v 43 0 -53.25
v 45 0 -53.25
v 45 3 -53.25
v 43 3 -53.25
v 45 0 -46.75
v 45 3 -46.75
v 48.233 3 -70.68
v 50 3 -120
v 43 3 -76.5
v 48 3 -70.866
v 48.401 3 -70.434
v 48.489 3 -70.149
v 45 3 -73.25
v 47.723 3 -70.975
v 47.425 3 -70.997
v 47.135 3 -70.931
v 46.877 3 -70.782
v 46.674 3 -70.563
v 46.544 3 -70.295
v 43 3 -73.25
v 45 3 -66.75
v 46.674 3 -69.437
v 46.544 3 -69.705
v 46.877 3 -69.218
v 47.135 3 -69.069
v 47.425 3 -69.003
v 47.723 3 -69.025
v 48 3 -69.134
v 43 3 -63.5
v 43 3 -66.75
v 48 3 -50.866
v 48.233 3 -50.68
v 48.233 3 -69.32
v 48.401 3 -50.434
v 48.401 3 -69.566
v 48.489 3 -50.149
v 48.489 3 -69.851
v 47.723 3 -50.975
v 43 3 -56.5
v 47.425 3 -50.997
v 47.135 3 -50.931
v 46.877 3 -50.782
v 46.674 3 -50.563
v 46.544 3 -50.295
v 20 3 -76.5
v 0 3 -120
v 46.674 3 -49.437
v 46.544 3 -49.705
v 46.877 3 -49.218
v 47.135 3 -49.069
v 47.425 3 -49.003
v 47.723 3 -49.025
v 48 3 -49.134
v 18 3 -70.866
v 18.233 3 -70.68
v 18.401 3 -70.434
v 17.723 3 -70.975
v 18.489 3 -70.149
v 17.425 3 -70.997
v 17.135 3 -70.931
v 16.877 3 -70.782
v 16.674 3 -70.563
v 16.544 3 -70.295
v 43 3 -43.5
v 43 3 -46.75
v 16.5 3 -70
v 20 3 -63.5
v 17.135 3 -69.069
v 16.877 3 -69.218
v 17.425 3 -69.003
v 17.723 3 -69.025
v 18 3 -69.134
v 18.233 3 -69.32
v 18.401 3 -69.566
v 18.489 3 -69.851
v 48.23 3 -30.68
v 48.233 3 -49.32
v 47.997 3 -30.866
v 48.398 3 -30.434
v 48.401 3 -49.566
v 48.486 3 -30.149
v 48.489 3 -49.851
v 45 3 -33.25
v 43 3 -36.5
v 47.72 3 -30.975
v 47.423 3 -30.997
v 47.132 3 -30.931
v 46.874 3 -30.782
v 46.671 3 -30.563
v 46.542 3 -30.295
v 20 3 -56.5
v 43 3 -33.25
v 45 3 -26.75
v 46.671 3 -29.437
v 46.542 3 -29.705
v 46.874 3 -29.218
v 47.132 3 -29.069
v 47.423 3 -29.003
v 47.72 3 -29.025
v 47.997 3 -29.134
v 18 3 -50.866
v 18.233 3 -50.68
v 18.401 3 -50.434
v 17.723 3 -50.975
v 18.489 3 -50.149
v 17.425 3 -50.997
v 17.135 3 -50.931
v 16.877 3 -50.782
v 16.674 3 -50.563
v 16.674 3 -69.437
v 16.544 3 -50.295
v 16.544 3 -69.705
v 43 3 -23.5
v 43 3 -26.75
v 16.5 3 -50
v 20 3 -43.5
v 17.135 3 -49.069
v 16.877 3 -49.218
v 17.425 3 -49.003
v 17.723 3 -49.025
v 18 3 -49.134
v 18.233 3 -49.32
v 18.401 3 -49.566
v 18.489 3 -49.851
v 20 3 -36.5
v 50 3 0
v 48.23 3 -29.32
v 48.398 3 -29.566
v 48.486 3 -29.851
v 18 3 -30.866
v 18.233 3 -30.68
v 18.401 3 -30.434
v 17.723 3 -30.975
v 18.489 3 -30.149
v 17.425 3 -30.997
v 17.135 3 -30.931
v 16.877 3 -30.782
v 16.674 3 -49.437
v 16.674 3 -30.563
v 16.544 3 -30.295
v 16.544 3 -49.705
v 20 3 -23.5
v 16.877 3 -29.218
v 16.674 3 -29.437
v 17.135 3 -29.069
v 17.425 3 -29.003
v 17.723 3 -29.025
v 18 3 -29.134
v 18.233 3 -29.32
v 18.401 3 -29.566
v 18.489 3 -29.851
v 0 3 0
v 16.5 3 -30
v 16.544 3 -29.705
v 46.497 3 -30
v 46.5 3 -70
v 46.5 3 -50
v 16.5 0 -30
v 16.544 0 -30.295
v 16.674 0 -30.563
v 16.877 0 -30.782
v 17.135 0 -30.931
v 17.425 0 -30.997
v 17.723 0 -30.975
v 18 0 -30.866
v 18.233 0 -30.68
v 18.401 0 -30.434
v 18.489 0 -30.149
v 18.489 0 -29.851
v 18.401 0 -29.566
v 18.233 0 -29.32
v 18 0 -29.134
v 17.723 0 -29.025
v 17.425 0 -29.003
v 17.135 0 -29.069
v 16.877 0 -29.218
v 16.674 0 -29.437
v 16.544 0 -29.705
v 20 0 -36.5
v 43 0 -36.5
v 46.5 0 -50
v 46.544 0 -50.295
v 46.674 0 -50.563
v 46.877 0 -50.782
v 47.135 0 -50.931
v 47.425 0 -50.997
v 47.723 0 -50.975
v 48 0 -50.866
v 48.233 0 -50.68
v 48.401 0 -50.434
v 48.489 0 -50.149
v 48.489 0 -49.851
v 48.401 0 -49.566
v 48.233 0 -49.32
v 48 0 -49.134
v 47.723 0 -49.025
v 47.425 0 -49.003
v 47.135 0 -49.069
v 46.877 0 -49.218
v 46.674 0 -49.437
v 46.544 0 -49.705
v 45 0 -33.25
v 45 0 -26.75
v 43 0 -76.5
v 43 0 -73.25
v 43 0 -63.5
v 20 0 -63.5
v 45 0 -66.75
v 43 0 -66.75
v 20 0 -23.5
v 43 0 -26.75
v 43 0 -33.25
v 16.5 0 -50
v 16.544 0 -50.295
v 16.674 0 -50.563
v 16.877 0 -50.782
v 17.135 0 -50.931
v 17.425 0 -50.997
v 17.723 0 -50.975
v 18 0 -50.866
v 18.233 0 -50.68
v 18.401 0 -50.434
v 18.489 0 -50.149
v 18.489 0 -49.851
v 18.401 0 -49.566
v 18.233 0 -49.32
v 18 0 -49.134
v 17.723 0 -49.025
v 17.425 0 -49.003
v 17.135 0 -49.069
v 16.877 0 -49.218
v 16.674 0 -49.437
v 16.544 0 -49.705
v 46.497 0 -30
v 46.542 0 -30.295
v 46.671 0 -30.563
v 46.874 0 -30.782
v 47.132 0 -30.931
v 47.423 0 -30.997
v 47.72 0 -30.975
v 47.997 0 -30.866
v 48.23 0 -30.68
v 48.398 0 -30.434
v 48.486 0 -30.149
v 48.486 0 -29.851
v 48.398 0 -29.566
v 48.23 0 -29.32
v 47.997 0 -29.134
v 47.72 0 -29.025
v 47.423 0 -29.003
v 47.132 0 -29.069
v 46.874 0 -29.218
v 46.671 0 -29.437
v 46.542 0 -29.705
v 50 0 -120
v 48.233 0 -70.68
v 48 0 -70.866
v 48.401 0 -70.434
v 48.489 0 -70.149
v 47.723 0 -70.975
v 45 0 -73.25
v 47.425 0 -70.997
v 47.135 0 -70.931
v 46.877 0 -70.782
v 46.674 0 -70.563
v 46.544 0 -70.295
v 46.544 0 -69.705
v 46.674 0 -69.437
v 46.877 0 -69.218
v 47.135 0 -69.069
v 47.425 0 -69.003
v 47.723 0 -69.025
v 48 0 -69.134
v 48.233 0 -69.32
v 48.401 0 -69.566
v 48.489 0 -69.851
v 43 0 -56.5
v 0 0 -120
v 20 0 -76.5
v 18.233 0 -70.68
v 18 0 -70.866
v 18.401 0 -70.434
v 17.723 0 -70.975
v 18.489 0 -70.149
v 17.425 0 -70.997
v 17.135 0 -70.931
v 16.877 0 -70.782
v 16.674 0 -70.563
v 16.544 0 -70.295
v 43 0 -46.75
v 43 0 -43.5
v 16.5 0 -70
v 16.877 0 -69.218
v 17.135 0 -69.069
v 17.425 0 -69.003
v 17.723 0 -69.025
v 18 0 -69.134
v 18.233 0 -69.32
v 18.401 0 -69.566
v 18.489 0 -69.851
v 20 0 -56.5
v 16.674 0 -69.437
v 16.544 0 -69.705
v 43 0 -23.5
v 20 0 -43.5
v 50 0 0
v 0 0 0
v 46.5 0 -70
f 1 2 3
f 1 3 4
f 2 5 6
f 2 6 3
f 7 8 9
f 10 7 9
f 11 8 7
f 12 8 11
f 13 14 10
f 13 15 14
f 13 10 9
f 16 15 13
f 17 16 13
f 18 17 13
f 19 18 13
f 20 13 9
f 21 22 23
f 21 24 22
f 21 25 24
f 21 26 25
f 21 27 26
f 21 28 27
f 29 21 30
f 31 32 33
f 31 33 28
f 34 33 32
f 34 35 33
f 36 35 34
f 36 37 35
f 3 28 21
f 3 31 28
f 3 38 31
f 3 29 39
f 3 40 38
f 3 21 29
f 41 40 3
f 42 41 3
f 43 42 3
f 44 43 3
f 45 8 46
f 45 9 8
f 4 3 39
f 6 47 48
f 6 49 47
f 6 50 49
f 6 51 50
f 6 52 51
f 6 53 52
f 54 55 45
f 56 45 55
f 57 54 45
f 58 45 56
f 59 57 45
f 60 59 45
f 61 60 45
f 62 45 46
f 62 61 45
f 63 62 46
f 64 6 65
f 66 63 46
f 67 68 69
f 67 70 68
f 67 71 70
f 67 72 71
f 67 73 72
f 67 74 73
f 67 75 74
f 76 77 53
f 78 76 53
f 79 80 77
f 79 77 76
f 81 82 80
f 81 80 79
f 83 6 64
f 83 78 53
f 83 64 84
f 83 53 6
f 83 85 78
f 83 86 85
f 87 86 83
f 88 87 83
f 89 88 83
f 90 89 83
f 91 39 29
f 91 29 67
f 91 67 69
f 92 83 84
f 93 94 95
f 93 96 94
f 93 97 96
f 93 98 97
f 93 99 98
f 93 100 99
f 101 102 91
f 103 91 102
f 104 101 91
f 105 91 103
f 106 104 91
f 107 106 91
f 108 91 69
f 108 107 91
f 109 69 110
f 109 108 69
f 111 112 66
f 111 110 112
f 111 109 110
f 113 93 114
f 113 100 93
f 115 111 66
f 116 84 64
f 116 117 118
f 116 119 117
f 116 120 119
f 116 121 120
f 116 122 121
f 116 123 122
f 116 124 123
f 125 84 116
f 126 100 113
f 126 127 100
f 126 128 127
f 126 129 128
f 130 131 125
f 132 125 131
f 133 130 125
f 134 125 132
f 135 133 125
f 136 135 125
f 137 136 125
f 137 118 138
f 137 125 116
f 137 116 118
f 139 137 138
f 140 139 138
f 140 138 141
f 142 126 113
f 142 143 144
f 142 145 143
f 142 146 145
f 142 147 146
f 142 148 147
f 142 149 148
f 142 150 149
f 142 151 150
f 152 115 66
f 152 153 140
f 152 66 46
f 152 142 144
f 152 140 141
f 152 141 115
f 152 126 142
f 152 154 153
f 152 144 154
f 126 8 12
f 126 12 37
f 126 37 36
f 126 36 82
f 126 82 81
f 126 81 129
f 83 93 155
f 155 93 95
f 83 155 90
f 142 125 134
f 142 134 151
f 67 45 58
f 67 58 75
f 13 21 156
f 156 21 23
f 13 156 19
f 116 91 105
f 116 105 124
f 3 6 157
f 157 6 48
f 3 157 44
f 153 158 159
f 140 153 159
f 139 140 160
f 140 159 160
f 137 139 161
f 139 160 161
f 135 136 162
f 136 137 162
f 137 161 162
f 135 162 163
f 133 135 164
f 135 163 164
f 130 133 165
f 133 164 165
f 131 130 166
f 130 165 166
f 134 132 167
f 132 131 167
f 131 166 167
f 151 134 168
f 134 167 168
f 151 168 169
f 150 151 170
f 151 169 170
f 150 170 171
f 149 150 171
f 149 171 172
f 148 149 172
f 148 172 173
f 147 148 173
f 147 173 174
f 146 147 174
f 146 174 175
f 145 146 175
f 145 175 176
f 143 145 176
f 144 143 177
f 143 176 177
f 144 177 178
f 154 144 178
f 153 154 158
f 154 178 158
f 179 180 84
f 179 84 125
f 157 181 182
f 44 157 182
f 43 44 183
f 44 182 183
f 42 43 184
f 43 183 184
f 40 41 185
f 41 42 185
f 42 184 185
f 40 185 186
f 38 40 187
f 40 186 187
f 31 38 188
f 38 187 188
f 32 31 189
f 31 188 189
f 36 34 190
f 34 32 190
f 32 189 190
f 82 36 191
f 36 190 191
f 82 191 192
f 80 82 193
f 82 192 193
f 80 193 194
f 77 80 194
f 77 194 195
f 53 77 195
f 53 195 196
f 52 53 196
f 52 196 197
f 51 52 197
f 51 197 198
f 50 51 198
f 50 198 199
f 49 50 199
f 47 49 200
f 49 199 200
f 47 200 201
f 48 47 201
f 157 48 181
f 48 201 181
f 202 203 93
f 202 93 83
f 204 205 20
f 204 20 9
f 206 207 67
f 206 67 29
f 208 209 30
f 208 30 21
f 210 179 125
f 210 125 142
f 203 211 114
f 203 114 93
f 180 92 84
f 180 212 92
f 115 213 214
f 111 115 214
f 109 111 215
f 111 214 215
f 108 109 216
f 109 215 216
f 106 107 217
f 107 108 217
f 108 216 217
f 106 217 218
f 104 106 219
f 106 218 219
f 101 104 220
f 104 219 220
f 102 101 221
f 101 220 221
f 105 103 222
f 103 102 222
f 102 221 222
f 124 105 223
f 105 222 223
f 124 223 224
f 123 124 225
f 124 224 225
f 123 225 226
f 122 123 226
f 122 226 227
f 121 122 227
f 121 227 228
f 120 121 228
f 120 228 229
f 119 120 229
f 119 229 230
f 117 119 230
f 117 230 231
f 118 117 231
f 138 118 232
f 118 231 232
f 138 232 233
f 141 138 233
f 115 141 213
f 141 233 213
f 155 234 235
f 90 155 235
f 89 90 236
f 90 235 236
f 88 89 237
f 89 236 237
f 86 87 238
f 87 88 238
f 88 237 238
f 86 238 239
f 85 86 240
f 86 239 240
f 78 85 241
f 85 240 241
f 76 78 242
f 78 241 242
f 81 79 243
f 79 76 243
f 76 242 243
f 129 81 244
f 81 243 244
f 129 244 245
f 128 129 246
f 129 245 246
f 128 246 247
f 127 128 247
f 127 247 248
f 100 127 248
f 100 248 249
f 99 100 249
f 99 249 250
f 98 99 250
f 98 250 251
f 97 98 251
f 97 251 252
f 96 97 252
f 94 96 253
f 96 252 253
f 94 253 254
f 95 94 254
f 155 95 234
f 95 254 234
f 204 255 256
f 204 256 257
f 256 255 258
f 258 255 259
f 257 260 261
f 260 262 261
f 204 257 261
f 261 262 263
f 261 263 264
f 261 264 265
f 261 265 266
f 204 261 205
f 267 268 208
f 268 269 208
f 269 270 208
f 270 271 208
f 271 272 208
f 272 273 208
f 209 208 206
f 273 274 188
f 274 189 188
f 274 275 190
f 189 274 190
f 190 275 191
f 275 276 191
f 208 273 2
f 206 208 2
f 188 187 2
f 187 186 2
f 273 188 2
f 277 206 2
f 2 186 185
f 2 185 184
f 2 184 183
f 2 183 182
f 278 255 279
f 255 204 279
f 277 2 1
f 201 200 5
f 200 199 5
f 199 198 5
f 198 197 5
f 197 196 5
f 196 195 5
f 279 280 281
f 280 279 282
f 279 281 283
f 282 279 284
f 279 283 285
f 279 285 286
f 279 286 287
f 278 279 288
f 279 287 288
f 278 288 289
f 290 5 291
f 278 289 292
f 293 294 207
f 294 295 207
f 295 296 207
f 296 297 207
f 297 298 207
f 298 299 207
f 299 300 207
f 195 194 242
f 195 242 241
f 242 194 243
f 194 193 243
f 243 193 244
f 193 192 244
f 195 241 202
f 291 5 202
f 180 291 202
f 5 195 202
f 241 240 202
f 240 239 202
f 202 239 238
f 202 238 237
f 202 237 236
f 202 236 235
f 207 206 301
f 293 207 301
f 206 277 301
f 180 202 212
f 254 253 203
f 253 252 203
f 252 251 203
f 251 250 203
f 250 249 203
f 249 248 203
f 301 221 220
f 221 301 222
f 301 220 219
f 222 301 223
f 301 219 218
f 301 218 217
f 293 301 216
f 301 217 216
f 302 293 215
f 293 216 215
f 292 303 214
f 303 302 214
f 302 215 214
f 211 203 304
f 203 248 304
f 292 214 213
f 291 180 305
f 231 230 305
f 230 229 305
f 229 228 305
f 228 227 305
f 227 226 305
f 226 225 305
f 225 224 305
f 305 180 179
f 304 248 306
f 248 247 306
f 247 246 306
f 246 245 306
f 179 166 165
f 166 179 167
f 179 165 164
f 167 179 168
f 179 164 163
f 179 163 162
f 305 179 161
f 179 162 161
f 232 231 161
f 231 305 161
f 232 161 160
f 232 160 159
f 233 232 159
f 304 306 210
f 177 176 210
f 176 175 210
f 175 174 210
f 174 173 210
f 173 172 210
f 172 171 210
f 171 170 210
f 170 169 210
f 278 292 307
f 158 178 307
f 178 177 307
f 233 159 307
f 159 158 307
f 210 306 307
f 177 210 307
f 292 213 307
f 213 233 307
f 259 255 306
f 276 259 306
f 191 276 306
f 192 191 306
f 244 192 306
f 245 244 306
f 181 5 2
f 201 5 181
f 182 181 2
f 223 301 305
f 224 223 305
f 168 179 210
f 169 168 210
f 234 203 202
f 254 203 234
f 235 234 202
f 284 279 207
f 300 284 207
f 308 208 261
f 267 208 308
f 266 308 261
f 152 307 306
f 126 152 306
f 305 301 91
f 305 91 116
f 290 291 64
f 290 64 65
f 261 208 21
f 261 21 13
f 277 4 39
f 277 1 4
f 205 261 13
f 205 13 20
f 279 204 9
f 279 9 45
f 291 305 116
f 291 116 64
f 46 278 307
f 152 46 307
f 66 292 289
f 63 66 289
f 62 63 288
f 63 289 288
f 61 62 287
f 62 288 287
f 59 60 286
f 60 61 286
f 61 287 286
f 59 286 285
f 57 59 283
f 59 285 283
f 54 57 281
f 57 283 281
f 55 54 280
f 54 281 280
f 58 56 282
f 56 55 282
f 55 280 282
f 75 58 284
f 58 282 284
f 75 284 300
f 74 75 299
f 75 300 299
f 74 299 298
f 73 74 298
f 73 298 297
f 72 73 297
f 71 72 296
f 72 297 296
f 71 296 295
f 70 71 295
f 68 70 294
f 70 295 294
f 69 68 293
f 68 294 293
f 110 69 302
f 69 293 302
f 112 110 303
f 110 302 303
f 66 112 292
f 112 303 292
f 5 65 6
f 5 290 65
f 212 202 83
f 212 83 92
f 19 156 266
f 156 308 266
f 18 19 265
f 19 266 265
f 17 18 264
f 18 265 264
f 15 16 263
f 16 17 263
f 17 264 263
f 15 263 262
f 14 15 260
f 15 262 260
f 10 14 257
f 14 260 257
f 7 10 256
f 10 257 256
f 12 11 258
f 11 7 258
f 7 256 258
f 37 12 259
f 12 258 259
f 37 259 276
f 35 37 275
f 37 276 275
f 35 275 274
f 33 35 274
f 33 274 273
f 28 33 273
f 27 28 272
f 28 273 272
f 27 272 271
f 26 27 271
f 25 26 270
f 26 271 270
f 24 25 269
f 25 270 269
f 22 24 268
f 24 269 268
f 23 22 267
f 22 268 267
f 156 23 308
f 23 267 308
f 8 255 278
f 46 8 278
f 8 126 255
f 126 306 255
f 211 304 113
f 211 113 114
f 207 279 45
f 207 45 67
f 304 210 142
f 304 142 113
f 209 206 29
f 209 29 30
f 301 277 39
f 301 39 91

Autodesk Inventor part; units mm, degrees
ref_plane "YZ Plane" through (0, 0, 0) normal (1, 0, 0) x (0, 1, 0)
ref_plane "XZ Plane" through (0, 0, 0) normal (0, 1, 0) x (-1, 0, 0)
ref_plane "XY Plane" through (0, 0, 0) normal (0, 0, 1) x (1, 0, 0)
sketch "Sketch1" plane through (0, 0, 0) normal (0, 1, 0) x (-1, 0, 0)
  point P0 (0, 0)
sketch "Sketch2" plane through (0, 0, 0) normal (0, 1, 0) x (-1, 0, 0)
  line L0 (0, 0) -> (-50, 0)
  line L1 (-50, 0) -> (-50, -120)
  line L2 (-50, -120) -> (0, -120)
  line L3 (0, -120) -> (0, 0)
  line L4 (-20, -23.5) -> (-43, -23.5)
  line L5 (-43, -23.5) -> (-43, -26.75)
  line L6 (-43, -26.75) -> (-45, -26.75)
  line L7 (-45, -26.75) -> (-45, -33.25)
  line L8 (-45, -33.25) -> (-43, -33.25)
  line L9 (-43, -33.25) -> (-43, -36.5)
  line L10 (-43, -36.5) -> (-20, -36.5)
  line L11 (-20, -36.5) -> (-20, -23.5)
  line L12 (-20, -43.5) -> (-43, -43.5)
  line L13 (-43, -43.5) -> (-43, -46.75)
  line L14 (-43, -46.75) -> (-45, -46.75)
  line L15 (-45, -46.75) -> (-45, -53.25)
  line L16 (-45, -53.25) -> (-43, -53.25)
  line L17 (-43, -53.25) -> (-43, -56.5)
  line L18 (-43, -56.5) -> (-20, -56.5)
  line L19 (-20, -56.5) -> (-20, -43.5)
  line L20 (-20, -63.5) -> (-43, -63.5)
  line L21 (-43, -63.5) -> (-43, -66.75)
  line L22 (-43, -66.75) -> (-45, -66.75)
  line L23 (-45, -66.75) -> (-45, -73.25)
  line L24 (-45, -73.25) -> (-43, -73.25)
  line L25 (-43, -73.25) -> (-43, -76.5)
  line L26 (-43, -76.5) -> (-20, -76.5)
  line L27 (-20, -76.5) -> (-20, -63.5)
  circle A0 centre (-17.5, -50) radius 1
  circle A1 centre (-17.5, -70) radius 1
  circle A2 centre (-17.5, -30) radius 1
  circle A3 centre (-47.4974, -30) radius 1
  circle A4 centre (-47.5, -50) radius 1
  circle A5 centre (-47.5, -70) radius 1
  dimension "d0" = 50
  dimension "d1" = 120
  dimension "d4" = 23
  dimension "d5" = 3.25
  dimension "d6" = 2
  dimension "d7" = 6.5
  dimension "d8" = 2
  dimension "d9" = 3.25
  dimension "d10" = 23
  dimension "d12" = 23
  dimension "d13" = 3.25
  dimension "d14" = 2
  dimension "d15" = 6.5
  dimension "d16" = 2
  dimension "d17" = 3.25
  dimension "d18" = 23
  dimension "d20" = 23
  dimension "d21" = 3.25
  dimension "d22" = 2
  dimension "d23" = 6.5
  dimension "d24" = 3.25
  dimension "d25" = 23
  dimension "d29" = 2
  dimension "d30" = 2
  dimension "d31" = 2
  dimension "d32" = 2
  dimension "d35" = 2
  dimension "d36" = 2
extrude "Extrusion1" add sketch "Sketch2" along normal blind 3
properties part number "Part1_FInal"
